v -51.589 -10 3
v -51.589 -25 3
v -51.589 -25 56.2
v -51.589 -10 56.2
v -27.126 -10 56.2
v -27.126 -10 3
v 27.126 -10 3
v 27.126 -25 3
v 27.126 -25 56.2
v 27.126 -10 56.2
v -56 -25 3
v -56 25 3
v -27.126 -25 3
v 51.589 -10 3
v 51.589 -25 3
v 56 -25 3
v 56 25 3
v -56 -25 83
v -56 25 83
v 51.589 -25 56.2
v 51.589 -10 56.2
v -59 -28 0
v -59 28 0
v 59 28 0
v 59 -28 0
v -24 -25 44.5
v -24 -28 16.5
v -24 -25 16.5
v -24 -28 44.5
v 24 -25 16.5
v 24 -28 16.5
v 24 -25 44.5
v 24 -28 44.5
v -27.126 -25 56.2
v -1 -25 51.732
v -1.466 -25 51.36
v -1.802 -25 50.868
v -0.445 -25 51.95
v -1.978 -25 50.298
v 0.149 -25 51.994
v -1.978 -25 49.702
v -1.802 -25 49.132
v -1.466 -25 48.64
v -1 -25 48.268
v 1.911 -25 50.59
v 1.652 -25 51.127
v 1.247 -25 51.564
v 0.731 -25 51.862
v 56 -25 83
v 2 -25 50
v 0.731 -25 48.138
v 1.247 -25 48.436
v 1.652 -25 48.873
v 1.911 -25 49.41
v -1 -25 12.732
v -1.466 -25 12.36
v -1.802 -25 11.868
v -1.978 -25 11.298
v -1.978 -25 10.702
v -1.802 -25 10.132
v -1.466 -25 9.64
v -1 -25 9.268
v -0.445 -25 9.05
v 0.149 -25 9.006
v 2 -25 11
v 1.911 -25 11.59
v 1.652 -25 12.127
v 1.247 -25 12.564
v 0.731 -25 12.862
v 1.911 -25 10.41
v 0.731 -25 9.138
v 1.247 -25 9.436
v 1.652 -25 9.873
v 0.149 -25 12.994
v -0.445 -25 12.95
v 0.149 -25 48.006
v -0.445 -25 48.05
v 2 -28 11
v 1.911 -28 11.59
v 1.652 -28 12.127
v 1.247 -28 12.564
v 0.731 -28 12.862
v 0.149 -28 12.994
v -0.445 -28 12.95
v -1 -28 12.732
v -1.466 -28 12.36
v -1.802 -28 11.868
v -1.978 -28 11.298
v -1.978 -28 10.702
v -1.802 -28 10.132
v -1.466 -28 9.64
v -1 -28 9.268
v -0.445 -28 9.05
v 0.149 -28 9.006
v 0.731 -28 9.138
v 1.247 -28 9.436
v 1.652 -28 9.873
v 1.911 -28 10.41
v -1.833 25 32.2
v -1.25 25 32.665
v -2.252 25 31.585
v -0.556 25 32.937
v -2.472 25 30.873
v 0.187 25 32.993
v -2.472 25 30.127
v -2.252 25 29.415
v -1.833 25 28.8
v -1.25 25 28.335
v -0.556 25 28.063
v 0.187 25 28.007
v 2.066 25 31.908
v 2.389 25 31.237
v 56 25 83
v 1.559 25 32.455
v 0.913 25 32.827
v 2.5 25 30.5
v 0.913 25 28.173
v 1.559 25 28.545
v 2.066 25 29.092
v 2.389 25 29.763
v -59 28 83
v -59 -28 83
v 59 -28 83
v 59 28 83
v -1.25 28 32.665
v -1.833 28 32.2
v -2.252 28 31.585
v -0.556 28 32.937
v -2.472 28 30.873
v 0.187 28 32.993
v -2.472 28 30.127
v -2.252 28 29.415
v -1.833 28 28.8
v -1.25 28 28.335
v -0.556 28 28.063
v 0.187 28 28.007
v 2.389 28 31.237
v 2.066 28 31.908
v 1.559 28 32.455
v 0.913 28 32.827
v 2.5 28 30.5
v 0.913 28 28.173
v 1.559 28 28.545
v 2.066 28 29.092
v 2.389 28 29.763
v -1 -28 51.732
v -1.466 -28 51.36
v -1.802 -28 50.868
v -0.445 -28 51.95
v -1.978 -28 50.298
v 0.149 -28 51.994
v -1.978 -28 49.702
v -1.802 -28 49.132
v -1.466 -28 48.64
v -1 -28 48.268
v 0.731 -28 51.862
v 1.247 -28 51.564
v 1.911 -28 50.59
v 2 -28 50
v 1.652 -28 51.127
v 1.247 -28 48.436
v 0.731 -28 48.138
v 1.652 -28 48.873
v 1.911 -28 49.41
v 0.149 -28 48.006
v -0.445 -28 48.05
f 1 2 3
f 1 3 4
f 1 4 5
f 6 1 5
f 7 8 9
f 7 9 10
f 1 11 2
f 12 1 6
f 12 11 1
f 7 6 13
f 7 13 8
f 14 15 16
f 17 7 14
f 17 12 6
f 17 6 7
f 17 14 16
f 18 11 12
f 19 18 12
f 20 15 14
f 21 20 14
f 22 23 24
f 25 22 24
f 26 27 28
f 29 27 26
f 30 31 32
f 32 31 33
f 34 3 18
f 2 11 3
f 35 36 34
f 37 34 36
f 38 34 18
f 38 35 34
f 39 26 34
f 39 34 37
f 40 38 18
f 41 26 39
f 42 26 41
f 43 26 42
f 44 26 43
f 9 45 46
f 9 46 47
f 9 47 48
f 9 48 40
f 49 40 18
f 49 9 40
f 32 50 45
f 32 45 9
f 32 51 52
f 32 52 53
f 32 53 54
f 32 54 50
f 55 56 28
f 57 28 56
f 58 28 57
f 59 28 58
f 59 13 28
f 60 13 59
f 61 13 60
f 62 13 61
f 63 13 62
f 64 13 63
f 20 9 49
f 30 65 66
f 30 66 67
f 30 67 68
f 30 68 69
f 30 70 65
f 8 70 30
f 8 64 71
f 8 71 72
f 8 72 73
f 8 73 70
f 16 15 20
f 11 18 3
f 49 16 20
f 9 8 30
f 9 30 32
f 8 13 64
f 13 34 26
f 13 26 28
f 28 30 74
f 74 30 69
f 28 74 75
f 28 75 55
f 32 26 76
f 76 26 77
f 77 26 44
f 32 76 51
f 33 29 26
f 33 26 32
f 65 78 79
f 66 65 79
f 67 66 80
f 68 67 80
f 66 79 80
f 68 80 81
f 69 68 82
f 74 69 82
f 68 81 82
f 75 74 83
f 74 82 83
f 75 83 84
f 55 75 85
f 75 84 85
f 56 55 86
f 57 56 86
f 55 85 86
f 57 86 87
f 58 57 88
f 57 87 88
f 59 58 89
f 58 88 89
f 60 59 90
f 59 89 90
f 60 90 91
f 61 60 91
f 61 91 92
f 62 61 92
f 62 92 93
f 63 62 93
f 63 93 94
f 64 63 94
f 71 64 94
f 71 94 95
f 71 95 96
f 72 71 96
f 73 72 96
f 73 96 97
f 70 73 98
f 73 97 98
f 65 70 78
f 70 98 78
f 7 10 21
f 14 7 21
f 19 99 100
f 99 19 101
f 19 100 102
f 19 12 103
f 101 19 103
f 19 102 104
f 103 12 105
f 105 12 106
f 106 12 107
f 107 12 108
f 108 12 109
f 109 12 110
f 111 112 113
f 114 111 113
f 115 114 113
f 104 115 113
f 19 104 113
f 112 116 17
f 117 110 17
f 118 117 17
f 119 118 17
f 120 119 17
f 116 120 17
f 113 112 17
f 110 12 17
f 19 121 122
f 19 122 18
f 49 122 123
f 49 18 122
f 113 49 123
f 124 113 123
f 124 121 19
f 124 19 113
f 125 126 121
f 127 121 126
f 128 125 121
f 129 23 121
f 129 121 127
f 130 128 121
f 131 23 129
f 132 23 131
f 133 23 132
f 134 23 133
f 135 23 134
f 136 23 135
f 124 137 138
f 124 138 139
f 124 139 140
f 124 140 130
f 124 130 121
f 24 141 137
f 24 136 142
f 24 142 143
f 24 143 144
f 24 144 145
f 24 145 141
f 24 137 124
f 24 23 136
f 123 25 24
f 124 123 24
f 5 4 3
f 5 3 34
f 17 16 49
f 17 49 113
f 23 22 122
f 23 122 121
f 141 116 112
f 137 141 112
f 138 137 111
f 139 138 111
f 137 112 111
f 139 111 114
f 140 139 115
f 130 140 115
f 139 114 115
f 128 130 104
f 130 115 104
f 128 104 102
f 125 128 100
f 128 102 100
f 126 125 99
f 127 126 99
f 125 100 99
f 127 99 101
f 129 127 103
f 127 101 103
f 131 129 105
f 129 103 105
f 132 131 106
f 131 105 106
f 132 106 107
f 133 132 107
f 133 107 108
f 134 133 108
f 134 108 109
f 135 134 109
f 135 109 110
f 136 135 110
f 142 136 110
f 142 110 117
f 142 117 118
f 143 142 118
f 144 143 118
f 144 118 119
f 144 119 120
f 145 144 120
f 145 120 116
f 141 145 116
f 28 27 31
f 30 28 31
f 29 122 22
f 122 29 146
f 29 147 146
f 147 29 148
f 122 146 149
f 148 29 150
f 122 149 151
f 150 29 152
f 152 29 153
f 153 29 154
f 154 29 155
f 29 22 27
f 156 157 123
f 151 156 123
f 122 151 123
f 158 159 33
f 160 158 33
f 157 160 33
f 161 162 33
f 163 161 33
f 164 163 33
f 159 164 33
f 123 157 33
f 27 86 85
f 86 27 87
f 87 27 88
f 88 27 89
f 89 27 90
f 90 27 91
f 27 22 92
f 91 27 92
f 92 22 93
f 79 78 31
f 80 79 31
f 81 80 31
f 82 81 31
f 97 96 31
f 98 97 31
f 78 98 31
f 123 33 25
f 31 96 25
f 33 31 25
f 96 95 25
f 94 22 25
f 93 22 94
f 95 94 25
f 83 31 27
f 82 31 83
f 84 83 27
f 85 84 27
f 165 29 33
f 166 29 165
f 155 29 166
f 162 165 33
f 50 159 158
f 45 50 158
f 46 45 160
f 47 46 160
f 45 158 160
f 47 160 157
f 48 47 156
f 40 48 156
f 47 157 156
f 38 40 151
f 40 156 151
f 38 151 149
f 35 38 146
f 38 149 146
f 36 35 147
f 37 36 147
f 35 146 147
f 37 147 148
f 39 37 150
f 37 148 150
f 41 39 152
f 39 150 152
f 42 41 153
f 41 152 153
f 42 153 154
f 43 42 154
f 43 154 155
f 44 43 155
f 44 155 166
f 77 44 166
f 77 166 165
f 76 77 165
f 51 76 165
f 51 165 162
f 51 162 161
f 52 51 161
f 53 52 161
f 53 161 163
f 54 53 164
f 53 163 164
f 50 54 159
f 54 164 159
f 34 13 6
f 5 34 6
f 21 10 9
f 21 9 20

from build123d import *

# Parameters (mm, degrees)
F0_W     = 112
F0_H     = 50
F1_DEPTH = 3
F0_W_2   = 118
F0_H_2   = 56
F2_DEPTH = 83
F3_W     = 48
F3_H     = 28
F3_R     = 2.5
F4_DEPTH = 3
F3_R_2   = 2
F5_DEPTH = 3
F6_DEPTH = 76.6
F7_W     = 24.463284
F7_H     = 15
F8_DEPTH = 53.2


with BuildPart() as f1:
    # F0 (on Top) → F1 (new body)
    with BuildSketch(Plane.XY):
        Rectangle(F0_W, F0_H)
    extrude(amount=F1_DEPTH)

    # F0 (on Top) → F2 (join)
    with BuildSketch(Plane.XY):
        Rectangle(F0_W_2, F0_H_2)
        Rectangle(F0_W, F0_H, mode=Mode.SUBTRACT)
    extrude(amount=F2_DEPTH)

    # F3 (on face) → F4 (cut)
    with BuildSketch(Plane.XZ.offset(28)):
        with Locations((0, 30.5)):
            Rectangle(F3_W, F3_H)
        with Locations((0, 30.5)):
            Circle(F3_R, mode=Mode.SUBTRACT)
        with Locations((0, 30.5)):
            Circle(F3_R)
    extrude(amount=-F4_DEPTH, mode=Mode.SUBTRACT)

    # F3 (on face) → F5 (cut)
    with BuildSketch(Plane.XZ.offset(28)):
        with Locations((0, 50)):
            Circle(F3_R_2)
        with Locations((0, 11)):
            Circle(F3_R_2)
    extrude(amount=-F5_DEPTH, mode=Mode.SUBTRACT)

    # F3 (on face) → F6 (cut)
    with BuildSketch(Plane.XZ.offset(28)):
        with Locations((0, 30.5)):
            Circle(F3_R)
    extrude(amount=-F6_DEPTH, mode=Mode.SUBTRACT)

    # F7 (on face) → F8 (join)
    with BuildSketch(Plane.XY.offset(3)):
        with Locations((-39.3574, -17.5)):
            Rectangle(F7_W, F7_H)
        with Locations((39.3574, -17.5)):
            Rectangle(F7_W, F7_H)
    extrude(amount=F8_DEPTH)


solid = f1.part
